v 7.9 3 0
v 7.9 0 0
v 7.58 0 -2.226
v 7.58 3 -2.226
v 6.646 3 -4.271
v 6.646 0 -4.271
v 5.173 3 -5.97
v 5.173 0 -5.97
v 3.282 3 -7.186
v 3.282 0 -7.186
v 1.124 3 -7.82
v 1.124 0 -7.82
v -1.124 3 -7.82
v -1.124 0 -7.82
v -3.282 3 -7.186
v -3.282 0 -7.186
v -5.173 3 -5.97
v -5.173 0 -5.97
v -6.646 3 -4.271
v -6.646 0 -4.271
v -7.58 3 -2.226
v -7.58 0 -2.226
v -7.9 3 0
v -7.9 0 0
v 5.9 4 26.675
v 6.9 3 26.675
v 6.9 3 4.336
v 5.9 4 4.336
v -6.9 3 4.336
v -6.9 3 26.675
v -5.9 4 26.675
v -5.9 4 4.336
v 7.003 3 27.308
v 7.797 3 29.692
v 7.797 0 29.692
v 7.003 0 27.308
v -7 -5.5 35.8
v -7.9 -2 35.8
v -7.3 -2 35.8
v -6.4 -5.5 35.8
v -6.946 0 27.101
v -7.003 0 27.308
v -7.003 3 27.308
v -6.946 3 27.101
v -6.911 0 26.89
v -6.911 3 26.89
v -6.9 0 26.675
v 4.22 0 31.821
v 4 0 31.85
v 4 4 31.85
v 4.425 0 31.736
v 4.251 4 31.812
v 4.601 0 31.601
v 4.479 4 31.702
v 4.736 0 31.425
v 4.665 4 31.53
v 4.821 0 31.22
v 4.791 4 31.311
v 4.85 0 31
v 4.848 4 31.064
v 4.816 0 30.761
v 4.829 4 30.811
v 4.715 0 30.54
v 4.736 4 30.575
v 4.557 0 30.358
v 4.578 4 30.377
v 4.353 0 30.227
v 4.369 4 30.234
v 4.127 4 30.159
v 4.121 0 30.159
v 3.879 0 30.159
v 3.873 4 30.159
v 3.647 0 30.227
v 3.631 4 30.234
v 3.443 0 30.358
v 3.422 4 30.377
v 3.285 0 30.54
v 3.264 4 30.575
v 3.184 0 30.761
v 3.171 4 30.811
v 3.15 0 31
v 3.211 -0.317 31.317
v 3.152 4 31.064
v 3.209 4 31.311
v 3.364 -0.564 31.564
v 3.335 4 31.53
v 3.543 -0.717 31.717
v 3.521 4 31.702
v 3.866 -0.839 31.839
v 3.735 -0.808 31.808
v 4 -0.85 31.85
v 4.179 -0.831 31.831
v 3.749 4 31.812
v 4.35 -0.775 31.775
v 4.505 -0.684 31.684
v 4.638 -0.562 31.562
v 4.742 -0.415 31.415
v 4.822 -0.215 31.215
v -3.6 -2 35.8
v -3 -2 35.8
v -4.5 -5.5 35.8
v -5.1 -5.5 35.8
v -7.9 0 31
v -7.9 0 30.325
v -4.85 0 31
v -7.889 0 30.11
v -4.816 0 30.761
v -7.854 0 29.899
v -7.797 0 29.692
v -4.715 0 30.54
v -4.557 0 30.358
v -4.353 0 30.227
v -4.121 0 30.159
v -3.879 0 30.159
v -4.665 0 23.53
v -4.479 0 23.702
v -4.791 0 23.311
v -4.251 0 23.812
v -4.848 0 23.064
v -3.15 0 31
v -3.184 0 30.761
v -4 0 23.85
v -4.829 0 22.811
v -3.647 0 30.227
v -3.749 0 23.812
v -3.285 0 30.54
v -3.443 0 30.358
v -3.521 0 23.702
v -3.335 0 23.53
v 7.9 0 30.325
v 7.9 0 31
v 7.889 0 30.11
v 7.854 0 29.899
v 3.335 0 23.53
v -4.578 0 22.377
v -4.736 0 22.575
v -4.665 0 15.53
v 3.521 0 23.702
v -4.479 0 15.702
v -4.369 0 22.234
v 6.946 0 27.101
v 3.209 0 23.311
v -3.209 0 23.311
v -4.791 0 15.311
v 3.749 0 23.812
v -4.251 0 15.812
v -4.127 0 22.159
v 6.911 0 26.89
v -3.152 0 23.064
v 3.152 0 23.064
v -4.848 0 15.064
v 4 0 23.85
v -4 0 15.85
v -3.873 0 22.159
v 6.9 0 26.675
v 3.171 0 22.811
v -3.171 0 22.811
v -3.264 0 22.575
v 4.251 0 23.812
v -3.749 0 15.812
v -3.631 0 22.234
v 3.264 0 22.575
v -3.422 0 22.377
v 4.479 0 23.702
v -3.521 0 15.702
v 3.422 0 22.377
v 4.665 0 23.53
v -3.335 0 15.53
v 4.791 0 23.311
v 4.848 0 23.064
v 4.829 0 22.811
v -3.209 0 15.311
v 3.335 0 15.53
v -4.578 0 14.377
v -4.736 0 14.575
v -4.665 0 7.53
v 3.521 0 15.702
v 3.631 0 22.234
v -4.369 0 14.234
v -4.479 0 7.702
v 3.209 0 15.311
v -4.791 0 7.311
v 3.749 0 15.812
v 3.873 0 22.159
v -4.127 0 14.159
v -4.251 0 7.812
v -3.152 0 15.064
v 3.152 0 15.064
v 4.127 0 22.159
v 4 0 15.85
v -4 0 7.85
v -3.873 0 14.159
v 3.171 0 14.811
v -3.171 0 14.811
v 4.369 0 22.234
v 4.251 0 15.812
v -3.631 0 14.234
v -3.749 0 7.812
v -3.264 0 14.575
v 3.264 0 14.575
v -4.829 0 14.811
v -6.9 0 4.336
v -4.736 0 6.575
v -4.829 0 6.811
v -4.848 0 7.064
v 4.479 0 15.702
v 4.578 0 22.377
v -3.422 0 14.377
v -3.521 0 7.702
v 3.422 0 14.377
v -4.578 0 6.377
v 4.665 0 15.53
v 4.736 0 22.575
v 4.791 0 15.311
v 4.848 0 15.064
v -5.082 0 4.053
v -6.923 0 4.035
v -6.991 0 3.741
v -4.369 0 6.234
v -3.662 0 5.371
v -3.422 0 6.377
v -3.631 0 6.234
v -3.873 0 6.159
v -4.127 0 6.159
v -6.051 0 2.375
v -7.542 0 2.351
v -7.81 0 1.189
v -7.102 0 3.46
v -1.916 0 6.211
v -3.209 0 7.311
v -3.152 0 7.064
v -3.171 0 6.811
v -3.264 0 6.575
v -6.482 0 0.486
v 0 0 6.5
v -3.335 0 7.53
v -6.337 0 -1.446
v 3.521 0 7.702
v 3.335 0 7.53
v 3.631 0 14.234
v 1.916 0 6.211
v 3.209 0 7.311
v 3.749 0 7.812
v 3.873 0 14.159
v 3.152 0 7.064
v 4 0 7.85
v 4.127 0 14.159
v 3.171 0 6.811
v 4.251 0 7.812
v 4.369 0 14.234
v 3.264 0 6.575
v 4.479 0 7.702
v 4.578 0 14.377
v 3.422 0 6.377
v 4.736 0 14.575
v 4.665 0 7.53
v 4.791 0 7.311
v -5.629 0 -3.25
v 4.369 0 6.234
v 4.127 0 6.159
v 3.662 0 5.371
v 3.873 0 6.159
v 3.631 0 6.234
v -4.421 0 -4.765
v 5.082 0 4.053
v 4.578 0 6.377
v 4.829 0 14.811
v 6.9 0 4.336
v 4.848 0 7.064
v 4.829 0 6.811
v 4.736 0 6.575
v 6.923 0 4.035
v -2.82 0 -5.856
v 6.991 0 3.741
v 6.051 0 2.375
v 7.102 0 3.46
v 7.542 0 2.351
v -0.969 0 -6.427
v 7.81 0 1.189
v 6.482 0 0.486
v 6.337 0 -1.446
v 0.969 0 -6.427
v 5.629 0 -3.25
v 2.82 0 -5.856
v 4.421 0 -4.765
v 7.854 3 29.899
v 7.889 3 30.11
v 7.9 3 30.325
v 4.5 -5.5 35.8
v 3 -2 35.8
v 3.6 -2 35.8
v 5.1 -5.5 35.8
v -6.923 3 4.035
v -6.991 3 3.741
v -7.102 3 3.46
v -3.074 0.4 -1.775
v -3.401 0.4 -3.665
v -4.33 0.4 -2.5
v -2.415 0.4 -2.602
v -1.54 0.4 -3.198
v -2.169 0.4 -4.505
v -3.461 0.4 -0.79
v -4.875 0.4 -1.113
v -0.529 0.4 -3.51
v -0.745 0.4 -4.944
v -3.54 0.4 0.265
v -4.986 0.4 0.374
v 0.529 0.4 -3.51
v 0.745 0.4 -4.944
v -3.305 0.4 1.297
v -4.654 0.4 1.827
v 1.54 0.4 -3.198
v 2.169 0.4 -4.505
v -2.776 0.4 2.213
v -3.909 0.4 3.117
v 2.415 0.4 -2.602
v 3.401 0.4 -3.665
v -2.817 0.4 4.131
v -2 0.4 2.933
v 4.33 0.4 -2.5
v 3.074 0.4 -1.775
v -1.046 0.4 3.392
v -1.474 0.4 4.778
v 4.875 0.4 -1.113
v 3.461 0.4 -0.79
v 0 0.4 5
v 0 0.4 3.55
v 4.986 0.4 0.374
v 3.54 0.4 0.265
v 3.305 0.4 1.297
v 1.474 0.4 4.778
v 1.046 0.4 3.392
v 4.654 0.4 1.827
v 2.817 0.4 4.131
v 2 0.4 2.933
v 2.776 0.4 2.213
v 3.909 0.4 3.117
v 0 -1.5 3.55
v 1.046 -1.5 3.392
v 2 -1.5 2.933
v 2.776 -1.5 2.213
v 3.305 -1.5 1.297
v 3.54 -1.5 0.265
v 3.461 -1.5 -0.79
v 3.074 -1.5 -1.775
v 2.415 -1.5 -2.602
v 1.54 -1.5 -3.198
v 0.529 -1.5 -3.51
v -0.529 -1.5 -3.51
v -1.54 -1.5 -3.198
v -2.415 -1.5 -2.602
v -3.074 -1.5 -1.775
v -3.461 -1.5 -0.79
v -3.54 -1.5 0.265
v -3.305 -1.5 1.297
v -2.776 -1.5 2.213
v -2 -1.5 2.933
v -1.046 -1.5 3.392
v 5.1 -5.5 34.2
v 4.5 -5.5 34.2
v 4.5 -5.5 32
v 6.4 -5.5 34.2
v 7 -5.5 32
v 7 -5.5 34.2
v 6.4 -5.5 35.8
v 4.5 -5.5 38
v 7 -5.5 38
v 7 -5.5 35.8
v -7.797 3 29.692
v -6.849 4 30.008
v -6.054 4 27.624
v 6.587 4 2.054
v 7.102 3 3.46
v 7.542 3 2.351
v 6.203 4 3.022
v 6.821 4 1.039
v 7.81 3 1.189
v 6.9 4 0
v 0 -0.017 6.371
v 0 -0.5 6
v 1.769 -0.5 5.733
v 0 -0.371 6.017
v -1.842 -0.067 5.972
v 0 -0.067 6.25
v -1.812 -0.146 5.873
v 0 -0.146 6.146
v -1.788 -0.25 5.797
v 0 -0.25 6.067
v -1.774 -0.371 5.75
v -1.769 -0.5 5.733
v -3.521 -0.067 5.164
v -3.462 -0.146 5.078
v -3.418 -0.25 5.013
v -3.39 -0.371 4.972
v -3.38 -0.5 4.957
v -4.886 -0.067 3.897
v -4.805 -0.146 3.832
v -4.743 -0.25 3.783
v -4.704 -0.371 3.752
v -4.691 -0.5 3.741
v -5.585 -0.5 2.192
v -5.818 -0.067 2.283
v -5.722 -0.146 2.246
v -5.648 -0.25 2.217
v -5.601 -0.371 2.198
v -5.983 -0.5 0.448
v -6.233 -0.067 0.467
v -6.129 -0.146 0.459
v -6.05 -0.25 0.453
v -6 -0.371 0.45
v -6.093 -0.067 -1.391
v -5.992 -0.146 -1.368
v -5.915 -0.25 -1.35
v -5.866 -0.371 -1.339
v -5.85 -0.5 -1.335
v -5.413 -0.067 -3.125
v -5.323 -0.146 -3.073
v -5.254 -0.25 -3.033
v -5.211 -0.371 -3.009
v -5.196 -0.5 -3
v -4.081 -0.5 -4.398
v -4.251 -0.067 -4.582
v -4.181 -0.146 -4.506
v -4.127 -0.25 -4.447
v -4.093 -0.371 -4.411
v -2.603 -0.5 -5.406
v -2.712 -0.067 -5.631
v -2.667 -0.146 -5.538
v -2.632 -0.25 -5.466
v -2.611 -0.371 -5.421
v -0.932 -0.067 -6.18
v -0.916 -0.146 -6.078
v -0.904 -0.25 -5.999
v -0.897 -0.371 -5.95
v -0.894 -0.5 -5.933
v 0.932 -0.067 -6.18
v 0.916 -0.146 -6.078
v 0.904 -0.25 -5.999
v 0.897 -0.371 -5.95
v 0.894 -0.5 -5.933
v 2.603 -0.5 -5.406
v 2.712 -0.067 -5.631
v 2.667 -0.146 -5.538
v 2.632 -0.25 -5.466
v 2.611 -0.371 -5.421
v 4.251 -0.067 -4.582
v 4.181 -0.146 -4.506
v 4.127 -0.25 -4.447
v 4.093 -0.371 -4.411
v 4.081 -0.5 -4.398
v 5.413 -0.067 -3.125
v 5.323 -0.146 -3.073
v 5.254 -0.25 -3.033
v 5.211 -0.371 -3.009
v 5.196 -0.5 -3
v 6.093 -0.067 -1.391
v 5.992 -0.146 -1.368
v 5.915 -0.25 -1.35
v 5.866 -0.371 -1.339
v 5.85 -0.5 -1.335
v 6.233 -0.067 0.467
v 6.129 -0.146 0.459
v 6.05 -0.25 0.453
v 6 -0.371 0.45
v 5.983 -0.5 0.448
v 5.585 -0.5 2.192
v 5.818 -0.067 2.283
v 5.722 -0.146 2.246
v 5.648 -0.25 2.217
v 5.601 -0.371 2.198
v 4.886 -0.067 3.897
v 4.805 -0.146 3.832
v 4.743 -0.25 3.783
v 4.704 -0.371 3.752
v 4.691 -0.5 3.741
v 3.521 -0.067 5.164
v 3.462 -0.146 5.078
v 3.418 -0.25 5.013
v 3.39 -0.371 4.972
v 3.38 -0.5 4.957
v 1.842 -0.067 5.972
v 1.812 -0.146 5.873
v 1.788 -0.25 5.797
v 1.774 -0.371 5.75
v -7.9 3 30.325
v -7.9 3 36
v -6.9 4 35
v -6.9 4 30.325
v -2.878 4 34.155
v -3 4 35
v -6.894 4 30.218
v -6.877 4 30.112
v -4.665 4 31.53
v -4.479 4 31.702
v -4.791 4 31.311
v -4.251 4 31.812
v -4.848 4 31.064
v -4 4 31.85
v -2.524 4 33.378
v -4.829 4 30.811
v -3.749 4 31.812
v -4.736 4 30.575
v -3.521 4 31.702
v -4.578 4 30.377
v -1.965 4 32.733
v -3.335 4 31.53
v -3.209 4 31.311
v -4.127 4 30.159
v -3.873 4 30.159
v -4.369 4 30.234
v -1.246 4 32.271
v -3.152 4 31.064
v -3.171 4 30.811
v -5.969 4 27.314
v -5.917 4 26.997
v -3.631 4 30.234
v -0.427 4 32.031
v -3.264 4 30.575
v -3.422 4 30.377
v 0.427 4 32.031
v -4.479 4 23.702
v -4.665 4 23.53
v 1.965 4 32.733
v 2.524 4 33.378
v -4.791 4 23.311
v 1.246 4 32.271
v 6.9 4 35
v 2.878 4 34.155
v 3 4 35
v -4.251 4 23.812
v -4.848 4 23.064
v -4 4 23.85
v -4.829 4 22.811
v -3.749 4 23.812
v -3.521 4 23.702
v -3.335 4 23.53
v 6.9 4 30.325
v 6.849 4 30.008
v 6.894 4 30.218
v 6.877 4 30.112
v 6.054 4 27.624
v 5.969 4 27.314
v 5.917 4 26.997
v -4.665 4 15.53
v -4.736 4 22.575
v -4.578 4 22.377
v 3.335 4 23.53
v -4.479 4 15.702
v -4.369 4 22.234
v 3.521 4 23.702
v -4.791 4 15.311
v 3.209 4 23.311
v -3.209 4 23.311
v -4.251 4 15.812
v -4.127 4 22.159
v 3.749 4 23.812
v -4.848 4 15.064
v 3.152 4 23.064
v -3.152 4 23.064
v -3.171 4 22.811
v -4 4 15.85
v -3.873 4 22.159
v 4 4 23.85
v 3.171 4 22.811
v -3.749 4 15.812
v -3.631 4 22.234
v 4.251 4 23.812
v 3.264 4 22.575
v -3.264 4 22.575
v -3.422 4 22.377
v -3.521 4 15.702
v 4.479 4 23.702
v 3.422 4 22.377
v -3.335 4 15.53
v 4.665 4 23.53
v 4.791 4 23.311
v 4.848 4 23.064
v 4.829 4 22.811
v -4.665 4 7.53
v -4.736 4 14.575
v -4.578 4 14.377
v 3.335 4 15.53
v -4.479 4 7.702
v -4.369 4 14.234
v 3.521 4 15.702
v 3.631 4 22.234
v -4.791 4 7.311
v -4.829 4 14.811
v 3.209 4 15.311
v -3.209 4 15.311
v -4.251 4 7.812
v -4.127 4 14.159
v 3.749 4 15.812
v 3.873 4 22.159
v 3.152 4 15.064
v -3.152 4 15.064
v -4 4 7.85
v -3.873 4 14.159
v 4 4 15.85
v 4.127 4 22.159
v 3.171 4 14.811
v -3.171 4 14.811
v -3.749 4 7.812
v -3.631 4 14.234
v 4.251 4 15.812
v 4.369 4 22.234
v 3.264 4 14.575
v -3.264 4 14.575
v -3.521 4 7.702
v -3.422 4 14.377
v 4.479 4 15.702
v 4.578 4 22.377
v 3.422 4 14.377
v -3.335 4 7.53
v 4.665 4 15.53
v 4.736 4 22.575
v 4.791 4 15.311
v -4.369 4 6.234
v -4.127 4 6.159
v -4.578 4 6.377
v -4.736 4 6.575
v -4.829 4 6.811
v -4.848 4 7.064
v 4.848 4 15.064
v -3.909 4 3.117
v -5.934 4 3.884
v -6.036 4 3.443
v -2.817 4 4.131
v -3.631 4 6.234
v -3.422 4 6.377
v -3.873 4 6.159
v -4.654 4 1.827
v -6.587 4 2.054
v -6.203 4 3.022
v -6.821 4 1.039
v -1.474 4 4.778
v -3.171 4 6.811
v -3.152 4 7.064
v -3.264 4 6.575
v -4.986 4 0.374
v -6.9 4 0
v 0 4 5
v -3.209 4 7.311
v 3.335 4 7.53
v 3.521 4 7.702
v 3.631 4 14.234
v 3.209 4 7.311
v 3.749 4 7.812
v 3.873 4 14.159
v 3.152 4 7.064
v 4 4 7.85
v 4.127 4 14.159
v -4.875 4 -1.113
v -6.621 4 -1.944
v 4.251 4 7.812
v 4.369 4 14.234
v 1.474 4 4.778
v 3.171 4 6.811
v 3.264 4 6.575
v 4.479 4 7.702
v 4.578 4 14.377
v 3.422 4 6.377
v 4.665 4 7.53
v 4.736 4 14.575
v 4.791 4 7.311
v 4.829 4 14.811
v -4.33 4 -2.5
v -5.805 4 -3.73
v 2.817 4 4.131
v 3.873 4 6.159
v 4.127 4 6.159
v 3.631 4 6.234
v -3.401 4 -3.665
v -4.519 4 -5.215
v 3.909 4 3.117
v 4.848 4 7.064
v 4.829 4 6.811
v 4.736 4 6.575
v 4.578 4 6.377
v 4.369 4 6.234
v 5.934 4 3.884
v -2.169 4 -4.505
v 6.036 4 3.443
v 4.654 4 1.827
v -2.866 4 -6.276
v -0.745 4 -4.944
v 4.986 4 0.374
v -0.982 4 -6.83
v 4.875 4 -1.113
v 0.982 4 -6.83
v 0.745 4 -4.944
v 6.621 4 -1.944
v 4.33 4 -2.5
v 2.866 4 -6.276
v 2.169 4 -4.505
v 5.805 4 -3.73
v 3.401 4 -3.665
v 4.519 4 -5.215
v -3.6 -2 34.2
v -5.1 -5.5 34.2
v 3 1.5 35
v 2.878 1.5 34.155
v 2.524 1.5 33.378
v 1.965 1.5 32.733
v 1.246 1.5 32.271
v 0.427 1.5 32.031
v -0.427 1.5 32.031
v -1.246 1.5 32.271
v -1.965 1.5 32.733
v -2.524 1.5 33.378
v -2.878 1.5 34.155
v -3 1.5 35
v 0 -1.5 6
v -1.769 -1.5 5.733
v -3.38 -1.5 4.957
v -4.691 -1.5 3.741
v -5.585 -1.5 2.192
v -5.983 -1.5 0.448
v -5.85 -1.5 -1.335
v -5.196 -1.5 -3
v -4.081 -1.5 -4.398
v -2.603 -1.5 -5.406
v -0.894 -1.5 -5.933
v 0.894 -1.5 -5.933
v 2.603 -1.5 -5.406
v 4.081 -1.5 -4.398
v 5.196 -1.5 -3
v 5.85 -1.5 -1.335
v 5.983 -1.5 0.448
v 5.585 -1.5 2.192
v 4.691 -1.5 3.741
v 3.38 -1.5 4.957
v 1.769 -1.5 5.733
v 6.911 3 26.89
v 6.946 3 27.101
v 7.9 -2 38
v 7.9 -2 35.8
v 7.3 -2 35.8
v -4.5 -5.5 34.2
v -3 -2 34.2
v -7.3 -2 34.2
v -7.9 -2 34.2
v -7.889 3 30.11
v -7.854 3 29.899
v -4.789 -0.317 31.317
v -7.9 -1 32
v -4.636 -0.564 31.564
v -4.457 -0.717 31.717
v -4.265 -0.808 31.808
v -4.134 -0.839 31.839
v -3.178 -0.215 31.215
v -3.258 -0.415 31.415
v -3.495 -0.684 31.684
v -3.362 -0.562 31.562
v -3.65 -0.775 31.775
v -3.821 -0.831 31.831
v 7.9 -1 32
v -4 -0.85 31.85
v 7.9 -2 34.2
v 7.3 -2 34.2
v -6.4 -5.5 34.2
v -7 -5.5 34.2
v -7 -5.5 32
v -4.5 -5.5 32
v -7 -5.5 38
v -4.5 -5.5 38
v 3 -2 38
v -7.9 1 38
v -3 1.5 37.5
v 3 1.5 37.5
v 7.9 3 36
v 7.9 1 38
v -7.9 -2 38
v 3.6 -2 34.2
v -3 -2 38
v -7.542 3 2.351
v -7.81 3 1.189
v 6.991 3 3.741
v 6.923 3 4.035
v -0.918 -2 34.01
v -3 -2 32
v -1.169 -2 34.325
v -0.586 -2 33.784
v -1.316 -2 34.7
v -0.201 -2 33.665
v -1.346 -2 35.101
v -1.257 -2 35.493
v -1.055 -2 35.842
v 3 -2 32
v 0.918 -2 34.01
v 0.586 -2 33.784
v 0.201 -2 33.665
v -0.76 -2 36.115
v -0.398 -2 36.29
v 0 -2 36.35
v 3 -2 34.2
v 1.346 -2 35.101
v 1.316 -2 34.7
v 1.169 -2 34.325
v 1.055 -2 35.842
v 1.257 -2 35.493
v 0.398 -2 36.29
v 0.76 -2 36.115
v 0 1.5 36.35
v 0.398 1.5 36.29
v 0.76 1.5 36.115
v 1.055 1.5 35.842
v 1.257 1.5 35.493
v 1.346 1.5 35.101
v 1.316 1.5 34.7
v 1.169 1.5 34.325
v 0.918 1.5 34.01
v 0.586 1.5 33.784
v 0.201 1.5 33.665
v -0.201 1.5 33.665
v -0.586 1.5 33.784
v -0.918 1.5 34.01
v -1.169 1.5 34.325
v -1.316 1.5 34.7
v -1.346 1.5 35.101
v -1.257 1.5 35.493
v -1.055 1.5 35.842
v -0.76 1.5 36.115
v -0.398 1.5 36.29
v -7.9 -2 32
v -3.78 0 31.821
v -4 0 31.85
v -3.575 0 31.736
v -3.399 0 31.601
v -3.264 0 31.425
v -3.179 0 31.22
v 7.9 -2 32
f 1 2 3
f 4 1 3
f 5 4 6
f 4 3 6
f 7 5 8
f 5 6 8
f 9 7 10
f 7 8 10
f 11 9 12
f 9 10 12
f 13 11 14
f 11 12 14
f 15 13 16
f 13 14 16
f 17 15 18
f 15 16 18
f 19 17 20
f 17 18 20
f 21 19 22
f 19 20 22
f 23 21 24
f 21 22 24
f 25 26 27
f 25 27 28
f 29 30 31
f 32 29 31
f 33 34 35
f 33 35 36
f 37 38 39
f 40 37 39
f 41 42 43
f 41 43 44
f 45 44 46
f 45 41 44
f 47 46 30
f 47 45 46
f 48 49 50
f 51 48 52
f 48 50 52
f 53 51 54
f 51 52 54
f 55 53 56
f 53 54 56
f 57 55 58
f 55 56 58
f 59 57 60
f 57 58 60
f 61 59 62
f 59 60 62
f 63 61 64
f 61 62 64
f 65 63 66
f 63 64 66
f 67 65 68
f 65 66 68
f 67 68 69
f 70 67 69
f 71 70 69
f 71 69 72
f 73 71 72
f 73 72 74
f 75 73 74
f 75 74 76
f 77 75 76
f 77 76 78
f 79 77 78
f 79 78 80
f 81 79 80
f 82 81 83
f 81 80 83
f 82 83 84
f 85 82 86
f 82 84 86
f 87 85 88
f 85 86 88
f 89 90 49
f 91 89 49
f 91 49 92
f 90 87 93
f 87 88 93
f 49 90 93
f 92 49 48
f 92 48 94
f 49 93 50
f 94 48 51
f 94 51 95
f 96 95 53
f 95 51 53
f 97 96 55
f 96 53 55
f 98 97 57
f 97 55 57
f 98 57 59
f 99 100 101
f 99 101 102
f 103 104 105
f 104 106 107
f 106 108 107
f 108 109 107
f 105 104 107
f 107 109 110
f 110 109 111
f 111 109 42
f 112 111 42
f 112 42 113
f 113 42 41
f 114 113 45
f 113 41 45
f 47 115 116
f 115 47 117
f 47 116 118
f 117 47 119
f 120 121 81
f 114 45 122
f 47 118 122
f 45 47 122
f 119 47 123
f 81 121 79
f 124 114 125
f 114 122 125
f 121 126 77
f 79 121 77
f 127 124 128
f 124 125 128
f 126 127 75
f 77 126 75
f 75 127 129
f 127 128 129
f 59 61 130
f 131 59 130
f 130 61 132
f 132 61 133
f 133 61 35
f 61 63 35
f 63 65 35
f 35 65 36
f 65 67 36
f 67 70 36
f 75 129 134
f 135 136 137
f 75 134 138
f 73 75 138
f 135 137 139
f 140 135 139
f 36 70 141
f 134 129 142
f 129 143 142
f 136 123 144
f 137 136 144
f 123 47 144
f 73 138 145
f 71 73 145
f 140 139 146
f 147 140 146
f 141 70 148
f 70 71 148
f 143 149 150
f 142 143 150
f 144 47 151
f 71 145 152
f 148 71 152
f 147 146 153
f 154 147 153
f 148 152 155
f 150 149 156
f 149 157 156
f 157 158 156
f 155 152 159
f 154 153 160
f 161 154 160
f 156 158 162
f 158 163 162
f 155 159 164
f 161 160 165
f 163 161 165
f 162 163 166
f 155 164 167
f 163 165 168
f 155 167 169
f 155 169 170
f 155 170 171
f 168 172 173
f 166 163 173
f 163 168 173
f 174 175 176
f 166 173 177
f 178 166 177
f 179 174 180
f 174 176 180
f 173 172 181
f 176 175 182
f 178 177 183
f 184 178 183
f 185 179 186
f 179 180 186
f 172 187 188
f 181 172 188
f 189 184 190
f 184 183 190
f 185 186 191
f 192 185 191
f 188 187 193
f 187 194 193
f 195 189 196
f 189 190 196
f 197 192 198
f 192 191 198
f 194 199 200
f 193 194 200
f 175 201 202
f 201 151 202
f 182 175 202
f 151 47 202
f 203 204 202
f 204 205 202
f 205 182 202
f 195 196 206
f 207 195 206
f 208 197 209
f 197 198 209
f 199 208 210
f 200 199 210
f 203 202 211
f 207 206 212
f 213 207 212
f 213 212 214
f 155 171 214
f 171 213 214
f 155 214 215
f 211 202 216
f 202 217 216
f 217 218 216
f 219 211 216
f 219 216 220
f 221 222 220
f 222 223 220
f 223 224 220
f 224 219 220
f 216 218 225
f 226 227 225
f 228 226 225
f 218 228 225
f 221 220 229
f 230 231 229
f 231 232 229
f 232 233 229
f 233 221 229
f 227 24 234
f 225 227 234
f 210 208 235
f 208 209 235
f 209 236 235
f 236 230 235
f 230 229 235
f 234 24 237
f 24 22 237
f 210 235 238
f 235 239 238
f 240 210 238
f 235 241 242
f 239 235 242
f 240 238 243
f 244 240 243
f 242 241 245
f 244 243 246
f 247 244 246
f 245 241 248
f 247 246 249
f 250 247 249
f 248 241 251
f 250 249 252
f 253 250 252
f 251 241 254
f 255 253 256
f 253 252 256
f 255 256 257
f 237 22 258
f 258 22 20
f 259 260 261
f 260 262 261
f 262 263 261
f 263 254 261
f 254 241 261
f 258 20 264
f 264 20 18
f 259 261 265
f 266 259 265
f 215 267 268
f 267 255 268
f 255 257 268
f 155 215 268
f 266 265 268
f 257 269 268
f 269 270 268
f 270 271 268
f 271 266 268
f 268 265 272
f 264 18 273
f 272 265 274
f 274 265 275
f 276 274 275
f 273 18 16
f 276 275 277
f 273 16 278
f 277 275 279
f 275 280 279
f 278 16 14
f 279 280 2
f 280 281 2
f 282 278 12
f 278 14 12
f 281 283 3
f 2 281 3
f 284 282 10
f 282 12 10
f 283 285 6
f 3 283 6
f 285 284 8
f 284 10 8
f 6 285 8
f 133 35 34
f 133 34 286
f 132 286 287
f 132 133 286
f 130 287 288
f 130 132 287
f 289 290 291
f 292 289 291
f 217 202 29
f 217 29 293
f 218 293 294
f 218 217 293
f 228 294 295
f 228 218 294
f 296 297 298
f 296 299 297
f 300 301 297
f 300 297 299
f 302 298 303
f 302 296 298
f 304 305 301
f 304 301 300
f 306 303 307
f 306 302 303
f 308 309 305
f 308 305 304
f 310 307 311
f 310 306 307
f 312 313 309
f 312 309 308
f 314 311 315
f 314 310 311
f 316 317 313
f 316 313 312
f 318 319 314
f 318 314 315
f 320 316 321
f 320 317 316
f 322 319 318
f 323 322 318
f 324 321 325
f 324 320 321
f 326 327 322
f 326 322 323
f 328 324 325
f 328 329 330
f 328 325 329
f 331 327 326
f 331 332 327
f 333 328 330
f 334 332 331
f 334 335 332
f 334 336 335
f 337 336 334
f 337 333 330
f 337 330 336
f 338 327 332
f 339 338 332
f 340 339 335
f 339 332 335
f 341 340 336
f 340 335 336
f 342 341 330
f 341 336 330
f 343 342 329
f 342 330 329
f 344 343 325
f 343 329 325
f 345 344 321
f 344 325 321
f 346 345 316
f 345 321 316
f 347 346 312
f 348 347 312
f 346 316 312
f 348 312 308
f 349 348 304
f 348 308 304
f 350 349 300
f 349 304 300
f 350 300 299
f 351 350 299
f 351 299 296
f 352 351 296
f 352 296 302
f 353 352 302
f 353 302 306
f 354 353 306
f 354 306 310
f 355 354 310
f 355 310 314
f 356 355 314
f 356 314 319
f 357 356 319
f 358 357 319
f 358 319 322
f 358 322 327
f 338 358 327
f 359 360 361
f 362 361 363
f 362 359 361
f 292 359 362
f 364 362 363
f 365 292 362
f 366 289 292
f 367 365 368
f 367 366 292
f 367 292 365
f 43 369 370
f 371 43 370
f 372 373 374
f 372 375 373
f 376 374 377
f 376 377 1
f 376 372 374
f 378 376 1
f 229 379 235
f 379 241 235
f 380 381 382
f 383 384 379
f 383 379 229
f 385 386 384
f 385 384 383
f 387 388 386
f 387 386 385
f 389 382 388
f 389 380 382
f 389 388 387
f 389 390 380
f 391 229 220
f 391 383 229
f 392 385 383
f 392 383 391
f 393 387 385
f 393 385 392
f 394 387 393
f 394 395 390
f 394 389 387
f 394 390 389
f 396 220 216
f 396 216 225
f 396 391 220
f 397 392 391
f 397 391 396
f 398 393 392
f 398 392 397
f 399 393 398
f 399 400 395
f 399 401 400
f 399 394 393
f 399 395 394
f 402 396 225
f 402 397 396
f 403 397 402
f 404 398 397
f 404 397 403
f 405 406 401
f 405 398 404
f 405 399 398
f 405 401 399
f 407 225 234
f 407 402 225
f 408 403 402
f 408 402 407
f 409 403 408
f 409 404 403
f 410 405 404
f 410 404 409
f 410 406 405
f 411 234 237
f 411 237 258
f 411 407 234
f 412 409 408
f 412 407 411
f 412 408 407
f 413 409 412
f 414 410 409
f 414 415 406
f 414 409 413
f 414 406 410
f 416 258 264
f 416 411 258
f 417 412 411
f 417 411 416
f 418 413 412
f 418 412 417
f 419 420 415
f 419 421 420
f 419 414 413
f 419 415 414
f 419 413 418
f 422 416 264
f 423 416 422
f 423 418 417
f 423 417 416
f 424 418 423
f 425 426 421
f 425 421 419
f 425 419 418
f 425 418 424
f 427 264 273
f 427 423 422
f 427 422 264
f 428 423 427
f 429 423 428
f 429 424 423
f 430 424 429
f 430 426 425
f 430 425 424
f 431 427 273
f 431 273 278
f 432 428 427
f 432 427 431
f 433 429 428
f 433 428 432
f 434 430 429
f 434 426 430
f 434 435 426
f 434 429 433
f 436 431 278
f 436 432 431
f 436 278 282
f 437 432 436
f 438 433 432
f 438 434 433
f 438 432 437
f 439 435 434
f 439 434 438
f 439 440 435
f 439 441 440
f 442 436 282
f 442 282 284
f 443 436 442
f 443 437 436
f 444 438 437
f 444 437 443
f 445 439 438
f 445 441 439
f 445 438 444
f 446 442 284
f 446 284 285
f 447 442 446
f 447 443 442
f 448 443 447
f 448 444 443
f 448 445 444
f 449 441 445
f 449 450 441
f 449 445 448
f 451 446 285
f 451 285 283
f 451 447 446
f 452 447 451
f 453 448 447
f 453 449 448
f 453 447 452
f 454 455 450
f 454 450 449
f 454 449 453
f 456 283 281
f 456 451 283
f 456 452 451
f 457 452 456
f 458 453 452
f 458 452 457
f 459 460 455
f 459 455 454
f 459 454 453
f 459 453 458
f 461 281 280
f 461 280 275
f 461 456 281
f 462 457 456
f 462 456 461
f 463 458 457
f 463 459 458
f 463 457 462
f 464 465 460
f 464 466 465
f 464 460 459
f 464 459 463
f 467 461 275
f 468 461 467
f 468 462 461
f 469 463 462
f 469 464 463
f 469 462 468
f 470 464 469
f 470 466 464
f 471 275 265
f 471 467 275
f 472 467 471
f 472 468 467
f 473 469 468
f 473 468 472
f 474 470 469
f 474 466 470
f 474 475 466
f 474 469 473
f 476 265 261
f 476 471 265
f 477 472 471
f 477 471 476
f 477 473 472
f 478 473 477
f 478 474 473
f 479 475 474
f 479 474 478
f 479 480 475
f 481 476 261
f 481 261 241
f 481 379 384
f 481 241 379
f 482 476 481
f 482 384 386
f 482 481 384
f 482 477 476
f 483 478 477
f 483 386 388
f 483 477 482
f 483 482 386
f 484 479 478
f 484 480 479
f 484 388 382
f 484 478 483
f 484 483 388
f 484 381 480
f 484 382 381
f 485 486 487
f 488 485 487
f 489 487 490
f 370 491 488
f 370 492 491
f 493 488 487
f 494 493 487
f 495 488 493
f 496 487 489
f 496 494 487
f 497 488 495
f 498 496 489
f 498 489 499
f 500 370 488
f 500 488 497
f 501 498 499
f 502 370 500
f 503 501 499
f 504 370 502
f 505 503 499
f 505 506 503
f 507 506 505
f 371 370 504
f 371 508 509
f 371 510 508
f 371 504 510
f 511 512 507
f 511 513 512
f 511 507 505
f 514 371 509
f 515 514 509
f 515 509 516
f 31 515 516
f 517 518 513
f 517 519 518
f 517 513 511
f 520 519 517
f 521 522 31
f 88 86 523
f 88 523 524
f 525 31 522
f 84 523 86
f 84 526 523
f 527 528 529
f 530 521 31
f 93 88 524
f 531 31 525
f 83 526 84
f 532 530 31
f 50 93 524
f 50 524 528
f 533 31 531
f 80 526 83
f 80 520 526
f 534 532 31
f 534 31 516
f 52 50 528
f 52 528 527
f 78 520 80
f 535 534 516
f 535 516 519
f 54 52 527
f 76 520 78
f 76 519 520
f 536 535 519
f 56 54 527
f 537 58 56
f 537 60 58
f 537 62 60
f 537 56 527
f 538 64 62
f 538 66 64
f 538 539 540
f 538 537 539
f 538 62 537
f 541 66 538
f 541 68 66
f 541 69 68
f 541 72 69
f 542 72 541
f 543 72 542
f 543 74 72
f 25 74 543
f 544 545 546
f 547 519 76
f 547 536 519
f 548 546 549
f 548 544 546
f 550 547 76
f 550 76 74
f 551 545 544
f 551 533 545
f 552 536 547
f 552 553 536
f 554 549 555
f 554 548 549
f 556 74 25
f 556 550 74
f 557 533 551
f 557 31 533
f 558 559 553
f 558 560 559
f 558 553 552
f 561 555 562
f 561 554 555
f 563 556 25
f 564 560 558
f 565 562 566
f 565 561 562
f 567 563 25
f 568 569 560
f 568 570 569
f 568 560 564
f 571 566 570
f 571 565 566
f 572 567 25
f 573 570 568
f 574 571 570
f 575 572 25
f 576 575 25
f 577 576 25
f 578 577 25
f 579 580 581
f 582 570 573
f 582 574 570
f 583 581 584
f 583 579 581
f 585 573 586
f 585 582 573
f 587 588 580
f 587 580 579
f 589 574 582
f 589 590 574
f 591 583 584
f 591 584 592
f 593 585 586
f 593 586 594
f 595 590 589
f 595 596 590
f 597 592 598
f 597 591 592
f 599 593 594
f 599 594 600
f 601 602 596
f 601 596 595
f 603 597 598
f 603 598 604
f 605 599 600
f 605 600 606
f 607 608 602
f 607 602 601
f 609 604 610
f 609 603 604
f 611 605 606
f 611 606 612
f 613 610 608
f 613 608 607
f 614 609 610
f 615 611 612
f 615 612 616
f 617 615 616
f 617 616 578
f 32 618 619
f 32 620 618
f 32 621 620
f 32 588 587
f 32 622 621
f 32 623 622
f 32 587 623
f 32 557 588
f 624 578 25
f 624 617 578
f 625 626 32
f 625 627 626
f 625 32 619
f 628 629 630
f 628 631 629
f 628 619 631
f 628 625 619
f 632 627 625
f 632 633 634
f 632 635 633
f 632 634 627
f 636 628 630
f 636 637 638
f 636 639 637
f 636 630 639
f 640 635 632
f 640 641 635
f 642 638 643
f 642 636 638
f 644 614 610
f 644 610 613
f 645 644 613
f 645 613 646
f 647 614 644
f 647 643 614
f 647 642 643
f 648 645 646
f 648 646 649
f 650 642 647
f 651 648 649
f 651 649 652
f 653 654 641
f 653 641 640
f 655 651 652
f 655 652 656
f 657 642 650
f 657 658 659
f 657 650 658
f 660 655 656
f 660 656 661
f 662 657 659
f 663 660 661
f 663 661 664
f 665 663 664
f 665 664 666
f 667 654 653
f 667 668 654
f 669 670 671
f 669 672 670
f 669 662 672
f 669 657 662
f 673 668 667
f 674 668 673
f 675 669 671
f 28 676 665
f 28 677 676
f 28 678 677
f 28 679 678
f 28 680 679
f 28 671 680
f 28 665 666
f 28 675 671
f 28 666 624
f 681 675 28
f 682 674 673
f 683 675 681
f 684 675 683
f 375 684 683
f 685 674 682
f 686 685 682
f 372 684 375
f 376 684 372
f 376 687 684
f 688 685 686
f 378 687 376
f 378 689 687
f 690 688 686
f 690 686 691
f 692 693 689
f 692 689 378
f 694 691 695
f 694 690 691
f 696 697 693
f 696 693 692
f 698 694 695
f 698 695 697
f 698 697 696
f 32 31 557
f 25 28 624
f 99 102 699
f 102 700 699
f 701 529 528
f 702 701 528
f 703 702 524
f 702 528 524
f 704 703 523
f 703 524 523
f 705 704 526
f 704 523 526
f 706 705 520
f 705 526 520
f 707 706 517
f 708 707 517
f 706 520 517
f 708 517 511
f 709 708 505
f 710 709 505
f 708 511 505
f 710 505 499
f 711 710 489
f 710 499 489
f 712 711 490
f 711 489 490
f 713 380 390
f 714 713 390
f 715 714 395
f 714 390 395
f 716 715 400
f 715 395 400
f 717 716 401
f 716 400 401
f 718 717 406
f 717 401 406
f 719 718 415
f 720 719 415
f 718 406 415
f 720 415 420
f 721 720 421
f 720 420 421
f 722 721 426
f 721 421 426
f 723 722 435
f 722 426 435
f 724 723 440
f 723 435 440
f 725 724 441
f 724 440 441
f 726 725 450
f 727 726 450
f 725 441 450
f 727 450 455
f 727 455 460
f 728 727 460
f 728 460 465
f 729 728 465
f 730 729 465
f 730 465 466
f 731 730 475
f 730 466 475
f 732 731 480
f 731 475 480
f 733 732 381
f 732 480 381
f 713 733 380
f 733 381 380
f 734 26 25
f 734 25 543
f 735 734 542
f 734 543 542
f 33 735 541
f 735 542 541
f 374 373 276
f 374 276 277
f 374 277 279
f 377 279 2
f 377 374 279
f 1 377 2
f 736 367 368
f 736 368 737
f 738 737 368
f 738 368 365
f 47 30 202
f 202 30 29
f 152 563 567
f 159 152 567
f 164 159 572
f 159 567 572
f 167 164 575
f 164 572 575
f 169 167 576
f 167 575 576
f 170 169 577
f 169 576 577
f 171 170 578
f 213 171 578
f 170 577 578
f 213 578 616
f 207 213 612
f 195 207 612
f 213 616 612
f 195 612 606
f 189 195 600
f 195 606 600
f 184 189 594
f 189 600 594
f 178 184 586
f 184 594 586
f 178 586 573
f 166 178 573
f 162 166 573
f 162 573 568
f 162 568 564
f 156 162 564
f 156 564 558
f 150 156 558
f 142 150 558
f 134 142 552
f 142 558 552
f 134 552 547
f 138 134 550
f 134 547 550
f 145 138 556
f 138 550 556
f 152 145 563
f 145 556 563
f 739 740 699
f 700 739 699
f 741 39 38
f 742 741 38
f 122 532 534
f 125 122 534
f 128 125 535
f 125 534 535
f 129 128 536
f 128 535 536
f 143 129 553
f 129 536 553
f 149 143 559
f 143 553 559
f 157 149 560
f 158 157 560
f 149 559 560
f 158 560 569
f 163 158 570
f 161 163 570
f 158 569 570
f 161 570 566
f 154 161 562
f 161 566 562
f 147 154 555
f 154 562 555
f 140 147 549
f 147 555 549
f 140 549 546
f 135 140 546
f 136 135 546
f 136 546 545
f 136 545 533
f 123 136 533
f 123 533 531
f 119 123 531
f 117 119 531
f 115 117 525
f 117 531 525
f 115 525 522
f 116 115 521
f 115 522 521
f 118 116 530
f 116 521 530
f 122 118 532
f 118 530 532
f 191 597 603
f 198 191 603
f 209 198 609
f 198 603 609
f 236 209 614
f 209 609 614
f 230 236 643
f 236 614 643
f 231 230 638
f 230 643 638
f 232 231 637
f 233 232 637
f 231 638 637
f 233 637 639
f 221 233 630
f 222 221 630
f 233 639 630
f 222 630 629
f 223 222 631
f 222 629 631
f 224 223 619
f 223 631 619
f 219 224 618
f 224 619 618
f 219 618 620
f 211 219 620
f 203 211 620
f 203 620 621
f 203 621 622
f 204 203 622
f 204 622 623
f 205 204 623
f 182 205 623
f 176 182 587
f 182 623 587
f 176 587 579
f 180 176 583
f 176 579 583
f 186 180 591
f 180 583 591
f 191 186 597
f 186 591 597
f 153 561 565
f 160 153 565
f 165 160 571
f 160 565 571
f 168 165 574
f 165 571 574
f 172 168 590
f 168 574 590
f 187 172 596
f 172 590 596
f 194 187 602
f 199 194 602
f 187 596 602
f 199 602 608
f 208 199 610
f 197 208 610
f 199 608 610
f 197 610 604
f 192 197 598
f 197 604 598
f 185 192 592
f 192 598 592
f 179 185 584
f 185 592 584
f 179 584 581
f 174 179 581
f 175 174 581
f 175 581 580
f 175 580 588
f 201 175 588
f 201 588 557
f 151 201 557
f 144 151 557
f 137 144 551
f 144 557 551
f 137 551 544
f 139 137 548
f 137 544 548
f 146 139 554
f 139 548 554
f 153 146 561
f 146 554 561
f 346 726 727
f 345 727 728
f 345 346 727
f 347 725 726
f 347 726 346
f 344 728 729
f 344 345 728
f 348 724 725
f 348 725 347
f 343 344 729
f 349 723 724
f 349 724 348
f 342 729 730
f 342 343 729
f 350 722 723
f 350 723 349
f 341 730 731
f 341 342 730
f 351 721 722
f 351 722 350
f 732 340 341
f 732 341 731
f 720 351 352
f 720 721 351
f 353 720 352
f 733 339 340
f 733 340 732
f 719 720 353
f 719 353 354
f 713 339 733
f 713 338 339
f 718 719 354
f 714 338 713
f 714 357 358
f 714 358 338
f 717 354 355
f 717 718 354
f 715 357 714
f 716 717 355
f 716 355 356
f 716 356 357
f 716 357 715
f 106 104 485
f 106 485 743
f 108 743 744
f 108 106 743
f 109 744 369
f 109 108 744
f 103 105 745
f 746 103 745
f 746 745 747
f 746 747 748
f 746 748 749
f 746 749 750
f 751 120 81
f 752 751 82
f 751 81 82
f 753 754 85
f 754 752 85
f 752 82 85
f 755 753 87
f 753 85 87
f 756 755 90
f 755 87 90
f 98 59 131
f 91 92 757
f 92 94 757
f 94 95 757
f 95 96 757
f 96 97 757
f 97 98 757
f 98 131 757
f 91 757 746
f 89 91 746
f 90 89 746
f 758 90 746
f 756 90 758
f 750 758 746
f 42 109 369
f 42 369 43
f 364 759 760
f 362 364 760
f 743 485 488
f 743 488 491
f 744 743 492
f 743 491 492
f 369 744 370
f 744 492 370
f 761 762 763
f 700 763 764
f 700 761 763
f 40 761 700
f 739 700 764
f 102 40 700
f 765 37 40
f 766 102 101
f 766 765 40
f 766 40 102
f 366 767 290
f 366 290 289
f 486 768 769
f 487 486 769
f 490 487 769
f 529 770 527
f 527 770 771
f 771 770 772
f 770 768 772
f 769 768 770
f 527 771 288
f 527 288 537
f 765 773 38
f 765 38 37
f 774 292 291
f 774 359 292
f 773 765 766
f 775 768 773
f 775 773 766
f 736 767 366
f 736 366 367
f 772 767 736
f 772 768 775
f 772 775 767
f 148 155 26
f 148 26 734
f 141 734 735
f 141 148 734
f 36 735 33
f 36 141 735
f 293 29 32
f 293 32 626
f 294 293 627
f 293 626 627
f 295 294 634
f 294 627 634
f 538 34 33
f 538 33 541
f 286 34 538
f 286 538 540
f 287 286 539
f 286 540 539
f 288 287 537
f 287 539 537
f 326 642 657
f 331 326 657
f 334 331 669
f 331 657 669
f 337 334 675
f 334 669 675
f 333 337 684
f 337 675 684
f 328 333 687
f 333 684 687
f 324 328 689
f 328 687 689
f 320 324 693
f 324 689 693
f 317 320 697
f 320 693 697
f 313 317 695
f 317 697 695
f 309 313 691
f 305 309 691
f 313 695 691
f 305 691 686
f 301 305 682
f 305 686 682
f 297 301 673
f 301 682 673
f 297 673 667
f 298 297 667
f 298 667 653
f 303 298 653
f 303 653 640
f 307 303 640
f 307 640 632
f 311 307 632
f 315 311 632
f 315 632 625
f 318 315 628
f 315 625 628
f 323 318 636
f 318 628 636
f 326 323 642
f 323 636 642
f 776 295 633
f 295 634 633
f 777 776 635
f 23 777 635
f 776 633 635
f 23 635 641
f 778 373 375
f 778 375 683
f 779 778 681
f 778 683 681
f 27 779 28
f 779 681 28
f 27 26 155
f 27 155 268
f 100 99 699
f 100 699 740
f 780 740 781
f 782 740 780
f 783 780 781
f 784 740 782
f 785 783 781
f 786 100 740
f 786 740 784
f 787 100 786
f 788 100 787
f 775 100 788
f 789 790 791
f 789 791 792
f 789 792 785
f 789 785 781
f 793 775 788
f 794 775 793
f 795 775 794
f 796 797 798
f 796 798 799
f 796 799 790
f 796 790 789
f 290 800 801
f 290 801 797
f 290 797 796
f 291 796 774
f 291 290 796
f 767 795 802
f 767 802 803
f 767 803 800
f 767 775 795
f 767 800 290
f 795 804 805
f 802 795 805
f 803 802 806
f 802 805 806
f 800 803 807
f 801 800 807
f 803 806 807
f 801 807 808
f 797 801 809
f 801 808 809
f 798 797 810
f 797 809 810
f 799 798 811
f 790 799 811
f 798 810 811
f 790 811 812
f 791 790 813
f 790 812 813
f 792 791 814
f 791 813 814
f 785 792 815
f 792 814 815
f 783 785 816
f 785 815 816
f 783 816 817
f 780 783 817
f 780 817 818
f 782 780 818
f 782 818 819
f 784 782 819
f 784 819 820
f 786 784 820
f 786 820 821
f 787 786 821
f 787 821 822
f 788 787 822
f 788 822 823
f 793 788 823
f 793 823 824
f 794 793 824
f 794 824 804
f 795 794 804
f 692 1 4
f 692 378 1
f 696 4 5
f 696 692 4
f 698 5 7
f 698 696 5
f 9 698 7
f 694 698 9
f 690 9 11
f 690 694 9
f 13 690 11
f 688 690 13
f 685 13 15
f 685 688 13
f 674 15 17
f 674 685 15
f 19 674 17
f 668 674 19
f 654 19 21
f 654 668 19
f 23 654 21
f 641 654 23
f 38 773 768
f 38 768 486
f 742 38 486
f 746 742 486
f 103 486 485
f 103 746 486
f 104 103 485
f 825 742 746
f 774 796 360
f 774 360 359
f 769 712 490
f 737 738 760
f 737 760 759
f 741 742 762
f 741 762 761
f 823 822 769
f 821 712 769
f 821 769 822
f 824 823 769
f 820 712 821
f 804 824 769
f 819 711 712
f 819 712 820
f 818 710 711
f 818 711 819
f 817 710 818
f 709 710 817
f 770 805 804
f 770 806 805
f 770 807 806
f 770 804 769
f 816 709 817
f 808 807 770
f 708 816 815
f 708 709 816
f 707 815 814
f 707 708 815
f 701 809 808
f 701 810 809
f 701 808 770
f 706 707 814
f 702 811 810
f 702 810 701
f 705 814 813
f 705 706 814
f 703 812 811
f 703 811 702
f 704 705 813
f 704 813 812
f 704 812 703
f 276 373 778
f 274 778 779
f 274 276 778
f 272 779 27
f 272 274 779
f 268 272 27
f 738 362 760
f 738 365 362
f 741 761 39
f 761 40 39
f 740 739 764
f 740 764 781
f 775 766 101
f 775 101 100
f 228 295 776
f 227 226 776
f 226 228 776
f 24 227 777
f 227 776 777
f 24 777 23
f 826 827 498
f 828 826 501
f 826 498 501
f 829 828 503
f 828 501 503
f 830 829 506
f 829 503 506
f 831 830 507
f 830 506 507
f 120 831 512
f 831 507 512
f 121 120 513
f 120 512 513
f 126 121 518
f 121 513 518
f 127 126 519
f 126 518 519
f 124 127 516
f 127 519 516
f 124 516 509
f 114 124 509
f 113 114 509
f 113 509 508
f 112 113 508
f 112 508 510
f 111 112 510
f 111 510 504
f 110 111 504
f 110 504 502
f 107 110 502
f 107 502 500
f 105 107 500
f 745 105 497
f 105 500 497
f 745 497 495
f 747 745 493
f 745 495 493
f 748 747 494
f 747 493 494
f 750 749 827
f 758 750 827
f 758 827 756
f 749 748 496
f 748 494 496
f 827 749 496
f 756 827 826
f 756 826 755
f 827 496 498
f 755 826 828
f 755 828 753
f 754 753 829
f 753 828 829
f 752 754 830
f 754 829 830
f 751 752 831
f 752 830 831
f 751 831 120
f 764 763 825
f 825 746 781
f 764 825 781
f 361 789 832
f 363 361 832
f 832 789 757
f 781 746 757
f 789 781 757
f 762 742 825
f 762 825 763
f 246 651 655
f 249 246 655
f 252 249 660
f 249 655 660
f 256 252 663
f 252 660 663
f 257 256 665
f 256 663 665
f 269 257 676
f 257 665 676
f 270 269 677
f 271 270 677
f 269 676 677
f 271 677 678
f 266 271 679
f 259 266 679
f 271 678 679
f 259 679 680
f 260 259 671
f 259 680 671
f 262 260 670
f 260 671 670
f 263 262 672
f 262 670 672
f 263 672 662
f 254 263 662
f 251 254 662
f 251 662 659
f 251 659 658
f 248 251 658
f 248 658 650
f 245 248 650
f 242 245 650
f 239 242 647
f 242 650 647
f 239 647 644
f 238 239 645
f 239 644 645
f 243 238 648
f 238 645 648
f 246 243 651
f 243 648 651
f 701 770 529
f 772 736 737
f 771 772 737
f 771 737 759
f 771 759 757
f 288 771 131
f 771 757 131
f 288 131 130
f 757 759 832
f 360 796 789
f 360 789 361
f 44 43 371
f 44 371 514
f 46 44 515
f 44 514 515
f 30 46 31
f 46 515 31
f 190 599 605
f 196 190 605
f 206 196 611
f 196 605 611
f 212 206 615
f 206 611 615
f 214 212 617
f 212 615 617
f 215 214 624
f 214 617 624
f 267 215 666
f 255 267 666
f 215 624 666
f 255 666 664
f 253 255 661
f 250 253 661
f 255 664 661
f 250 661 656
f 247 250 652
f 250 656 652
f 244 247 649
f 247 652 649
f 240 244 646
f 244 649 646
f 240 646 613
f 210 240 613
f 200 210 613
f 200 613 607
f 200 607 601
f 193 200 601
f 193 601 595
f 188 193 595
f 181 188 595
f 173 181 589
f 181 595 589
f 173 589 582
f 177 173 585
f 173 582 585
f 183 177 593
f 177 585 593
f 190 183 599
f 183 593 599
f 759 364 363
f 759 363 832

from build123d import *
from build123d.topology import SkipClean

# Parameters (mm, degrees)
EXTRUDE_1_DEPTH        = 4
EXTRUDE_3_DEPTH        = 6
CHAMFER_1_SIZE         = 3
SKETCH_5_R             = 0.85
CUT_EXTRUDE_1_DEPTH    = 4
PATTERN_LINEAR_1_COUNT = 4
PATTERN_LINEAR_1_PITCH = 8
CUT_EXTRUDE_2_DEPTH    = 2.5
CUT_EXTRUDE_3_REACH    = 41.439
SKETCH_7_R             = 1.35
SKETCH_8_R             = 6
EXTRUDE_4_DEPTH        = 1.5
FILLET_1_R             = 0.5
SKETCH_9_R             = 5
CUT_EXTRUDE_4_DEPTH    = 3.6
SKETCH_10_R            = 3.55
CUT_EXTRUDE_5_DEPTH    = 3.6
CUT_EXTRUDE_6_DEPTH    = 0.8
CUT_EXTRUDE_7_DEPTH    = 40.958228189
FILLET_2_R             = 2
CHAMFER_2_SIZE         = 1


with BuildPart() as part:
    # ｽｹｯﾁ1 → ﾎﾞｽ - 押し出し1 (new body)
    with BuildSketch(Plane(origin=(0, 0, 0), x_dir=(1, 0, 0), z_dir=(0, 1, 0))):
        with BuildLine():
            Line((-7.9, 0), (-7.9, -38))
            Line((-7.9, -38), (7.9, -38))
            Line((7.9, -38), (7.9, 0))
            ThreePointArc((7.9, 0), (0, 7.9), (-7.9, 0))
        make_face()
    extrude(amount=EXTRUDE_1_DEPTH)

    # ｽｹｯﾁ4 → ﾎﾞｽ - 押し出し3 (add)
    with BuildSketch(Plane.XY.offset(38)):
        Polygon((-7, -5.5), (-4.5, -5.5), (-3, -2), (3, -2), (4.5, -5.5), (7, -5.5), (7.9, -2), (7.9, 0), (-7.9, 0), (-7.9, -2), align=None)
    extrude(amount=-EXTRUDE_3_DEPTH)

    # 面取り1
    chamfer_1_edges = [part.edges().sort_by_distance(p)[0] for p in [
        (0, 4, 38),
    ]]
    chamfer(chamfer_1_edges, length=CHAMFER_1_SIZE)

    # ｽｹｯﾁ5 → ｶｯﾄ - 押し出し1 (cut)
    with BuildSketch(Plane(origin=(0, 4, 0), x_dir=(1, 0, 0), z_dir=(0, 1, 0))):
        with Locations(Location((-4, -31, 0), (0, 0, 270))):
            Circle(SKETCH_5_R)
        with Locations(Location((4, -31, 0), (0, 0, 270))):
            Circle(SKETCH_5_R)
    cut_extrude_1 = extrude(amount=-CUT_EXTRUDE_1_DEPTH, mode=Mode.SUBTRACT)

    # 直線ﾊﾟﾀｰﾝ1: ｶｯﾄ - 押し出し1 ×4
    with Locations(*[(0, 0, -i * PATTERN_LINEAR_1_PITCH) for i in range(1, PATTERN_LINEAR_1_COUNT)]):
        add(cut_extrude_1, mode=Mode.SUBTRACT)

    # ｽｹｯﾁ6 → ｶｯﾄ - 押し出し2 (cut)
    with BuildSketch(Plane(origin=(0, 4, 0), x_dir=(1, 0, 0), z_dir=(0, 1, 0))):
        with BuildLine():
            Line((-3, -35), (-3, -39))
            Line((-3, -39), (3, -39))
            Line((3, -39), (3, -35))
            ThreePointArc((3, -35), (0, -32), (-3, -35))
        make_face()
    extrude(amount=-CUT_EXTRUDE_2_DEPTH, mode=Mode.SUBTRACT)

    # ｽｹｯﾁ7 → ｶｯﾄ - 押し出し3 (cut, up to next)
    with BuildSketch(Plane(origin=(0, 1.5, 0), x_dir=(1, 0, 0), z_dir=(0, 1, 0)), mode=Mode.PRIVATE) as cut_extrude_3_sk1:
        with Locations(Location((0, -35, 0), (0, 0, 270))):
            Circle(SKETCH_7_R)
    cut_extrude_3_tool1 = extrude(cut_extrude_3_sk1.sketch, amount=-CUT_EXTRUDE_3_REACH, mode=Mode.PRIVATE) & part.part
    add(cut_extrude_3_tool1.solids().sort_by_distance((0, 1.5, 35))[0], mode=Mode.SUBTRACT)

    # ｽｹｯﾁ8 → ﾎﾞｽ - 押し出し4 (add)
    with BuildSketch(Plane.XZ):
        with Locations(Location((0, 0, 0), (0, 0, 90))):
            Circle(SKETCH_8_R)
    extrude(amount=EXTRUDE_4_DEPTH)

    # ﾌｨﾚｯﾄ1
    fillet_1_edges = [part.edges().sort_by_distance(p)[0] for p in [
        (0, 0, -6),
    ]]
    fillet(fillet_1_edges, radius=FILLET_1_R)

    # ｽｹｯﾁ9 → ｶｯﾄ - 押し出し4 (cut)
    with BuildSketch(Plane(origin=(0, 4, 0), x_dir=(1, 0, 0), z_dir=(0, 1, 0))):
        with Locations(Location((0, 0, 0), (0, 0, 270))):
            Circle(SKETCH_9_R)
    extrude(amount=-CUT_EXTRUDE_4_DEPTH, mode=Mode.SUBTRACT)

    # ｽｹｯﾁ10 → ｶｯﾄ - 押し出し5 (cut)
    with BuildSketch(Plane(origin=(0, 0.4, 0), x_dir=(1, 0, 0), z_dir=(0, 1, 0))):
        with Locations(Location((0, 0, 0), (0, 0, 270))):
            Circle(SKETCH_10_R)
    extrude(amount=-CUT_EXTRUDE_5_DEPTH, mode=Mode.SUBTRACT)

    # ｽｹｯﾁ11 → ｶｯﾄ - 押し出し6 (cut, symmetric)
    with BuildSketch(Plane.XY.offset(35)):
        Polygon((3, -2), (4.5, -5.5), (5.1, -5.5), (3.6, -2), align=None)
        Polygon((7.9, -2), (7, -5.5), (6.4, -5.5), (7.3, -2), align=None)
    cut_extrude_6 = extrude(amount=CUT_EXTRUDE_6_DEPTH, both=True, mode=Mode.SUBTRACT)

    # ﾐﾗｰ1: ｶｯﾄ - 押し出し6 across plane
    add(cut_extrude_6.mirror(Plane(origin=(0, 0, 0), x_dir=(0, 0, 1), z_dir=(1, 0, 0))), mode=Mode.SUBTRACT)

    # ｽｹｯﾁ12 → ｶｯﾄ - 押し出し7 (cut, through all)
    with SkipClean():  # the faces are left unmerged after this step: merging them gives an invalid solid
        with BuildSketch(Plane(origin=(0, 4, 0), x_dir=(1, 0, 0), z_dir=(0, 1, 0))):
            with BuildLine():
                Line((-7.9, 0), (-7.9, -30))
                Line((-7.9, -30), (-6.9, -27))
                Line((-6.9, -27), (-6.9, -3.847076812))
                ThreePointArc((-6.9, -3.847076812), (-7.645913941, -1.987460691), (-7.9, 0))
            make_face()
        cut_extrude_7 = extrude(amount=-CUT_EXTRUDE_7_DEPTH, mode=Mode.SUBTRACT)

    # ﾐﾗｰ2: ｶｯﾄ - 押し出し7 across plane
    with SkipClean():  # the faces are left unmerged after this step: merging them gives an invalid solid
        add(cut_extrude_7.mirror(Plane(origin=(0, 0, 0), x_dir=(0, 0, 1), z_dir=(1, 0, 0))), mode=Mode.SUBTRACT)

    # ﾌｨﾚｯﾄ2
    fillet_2_edges = [part.edges().sort_by_distance(p)[0] for p in [
        (-6.9, 2, 3.847076812),
        (-6.9, 2, 27),
        (-7.9, 2, 30),
        (6.9, 2, 3.847076812),
        (7.9, 2, 30),
        (6.9, 2, 27),
    ]]
    fillet(fillet_2_edges, radius=FILLET_2_R)

    # 面取り2
    # the kernel refuses this chamfer: 1 mm, written as the material it adds along each edge
    with BuildSketch(Plane(origin=(7.9, 0, 32), x_dir=(0, 0.02749587661058639, -0.9996219169112968), z_dir=(-1, 0, 0))) as chamfer_2_piece_1_section:
        Polygon((CHAMFER_2_SIZE * 0.999621916911, CHAMFER_2_SIZE * 0.0274958766106), (-CHAMFER_2_SIZE * 0.0274958766106, CHAMFER_2_SIZE * 0.999621916911), (0, 0), align=None)
    chamfer_2_piece_1 = extrude(amount=15.8, mode=Mode.PRIVATE)
    chamfer_2_piece_1 = chamfer_2_piece_1 - Plane(origin=(-4, -0.34097177, 31), x_dir=(0, 0, 1), z_dir=(0, 1, 0)) * Cylinder(0.85, 36, mode=Mode.PRIVATE)
    chamfer_2_piece_1 = chamfer_2_piece_1 - Plane(origin=(4, -0.34097177, 31), x_dir=(0, 0, 1), z_dir=(0, 1, 0)) * Cylinder(0.85, 36, mode=Mode.PRIVATE)
    add(chamfer_2_piece_1)
    # the kernel refuses this chamfer: 1 mm, written as the material it takes off along each edge
    with BuildSketch(Plane(origin=(-7.9, 4, 30.32455532), x_dir=(-0.027495876610586487, -0.9996219169112968, 0), z_dir=(0, 0, 1)), Plane(origin=(7.9, 4, 37.571682988), x_dir=(0.027495876610586487, -0.9996219169112968, 0), z_dir=(0, 0, -1))) as chamfer_2_2_piece_1:
        Polygon((CHAMFER_2_SIZE * 0.999621916911, CHAMFER_2_SIZE * 0.0274958766106), (-CHAMFER_2_SIZE * 0.0274958766106, CHAMFER_2_SIZE * 0.999621916911), (0, 0), align=None)
    extrude(amount=7.247127668, mode=Mode.SUBTRACT)
    with BuildSketch(Plane(origin=(0, 4, 0), x_dir=(1, 0, 0), z_dir=(0, 0, 1))) as chamfer_2_2_piece_2:
        Polygon((7.9, -CHAMFER_2_SIZE), (7.9 - CHAMFER_2_SIZE, 0), (7.9, 0), align=None)
    revolve(axis=Axis((0, 4, 0), (0, 1, 0)), revolution_arc=180, mode=Mode.SUBTRACT)
    with BuildSketch(Plane(origin=(-5.9, 4, 30.32455532), x_dir=(-1, 0, 0), z_dir=(0, 0, 1))) as chamfer_2_2_piece_3:
        Polygon((2, CHAMFER_2_SIZE), (2 - CHAMFER_2_SIZE, 0), (2, 0), align=None)
    revolve(axis=Axis((-5.9, 4, 30.32455532), (0, -1, 0)), revolution_arc=18.434948823, mode=Mode.SUBTRACT)
    with BuildSketch(Plane(origin=(-7.797366596, 4, 29.692099788), x_dir=(-0.02608487890572092, -0.9996219169112968, -0.008694959635240314), z_dir=(0.3162277660168382, 0, -0.9486832980505138))) as chamfer_2_2_piece_4:
        Polygon((CHAMFER_2_SIZE * 0.999621916911, -CHAMFER_2_SIZE * 0.0274958766106), (-CHAMFER_2_SIZE * 0.0274958766106, -CHAMFER_2_SIZE * 0.999621916911), (0, 0), align=None)
    extrude(amount=2.513167019, mode=Mode.SUBTRACT)
    with BuildSketch(Plane(origin=(-8.9, 4, 26.67544468), x_dir=(0.9486832980505135, 0, 0.3162277660168389), z_dir=(-0.3162277660168389, 0, 0.9486832980505135))) as chamfer_2_2_piece_5:
        Polygon((2, -CHAMFER_2_SIZE), (2 + CHAMFER_2_SIZE, 0), (2, 0), align=None)
    revolve(axis=Axis((-8.9, 4, 26.67544468), (0, 1, 0)), revolution_arc=18.434948823, mode=Mode.SUBTRACT)
    with BuildSketch(Plane(origin=(-6.9, 4, 26.67544468), x_dir=(-0.027495876610586487, -0.9996219169112968, 0), z_dir=(0, 0, -1))) as chamfer_2_2_piece_6:
        Polygon((CHAMFER_2_SIZE * 0.999621916911, -CHAMFER_2_SIZE * 0.0274958766106), (-CHAMFER_2_SIZE * 0.0274958766106, -CHAMFER_2_SIZE * 0.999621916911), (0, 0), align=None)
    extrude(amount=22.339548002, mode=Mode.SUBTRACT)
    with BuildSketch(Plane(origin=(-8.9, 4, 4.335896678), x_dir=(1, 0, 0), z_dir=(0, 0, 1))) as chamfer_2_2_piece_7:
        Polygon((2, -CHAMFER_2_SIZE), (2 + CHAMFER_2_SIZE, 0), (2, 0), align=None)
    revolve(axis=Axis((-8.9, 4, 4.335896678), (0, 1, 0)), revolution_arc=25.974390018, mode=Mode.SUBTRACT)
    with BuildSketch(Plane(origin=(8.9, 4, 4.335896678), x_dir=(-0.8989898989898989, 0, -0.43796936138745074), z_dir=(0.43796936138745074, 0, -0.8989898989898989))) as chamfer_2_2_piece_8:
        Polygon((2, -CHAMFER_2_SIZE), (2 + CHAMFER_2_SIZE, 0), (2, 0), align=None)
    revolve(axis=Axis((8.9, 4, 4.335896678), (0, 1, 0)), revolution_arc=25.974390018, mode=Mode.SUBTRACT)
    with BuildSketch(Plane(origin=(6.9, 4, 26.67544468), x_dir=(0.027495876610586487, -0.9996219169112968, 0), z_dir=(0, 0, -1))) as chamfer_2_2_piece_9:
        Polygon((CHAMFER_2_SIZE * 0.999621916911, CHAMFER_2_SIZE * 0.0274958766106), (-CHAMFER_2_SIZE * 0.0274958766106, CHAMFER_2_SIZE * 0.999621916911), (0, 0), align=None)
    extrude(amount=22.339548002, mode=Mode.SUBTRACT)
    with BuildSketch(Plane(origin=(8.9, 4, 26.67544468), x_dir=(-1, 0, 0), z_dir=(0, 0, -1))) as chamfer_2_2_piece_10:
        Polygon((2, -CHAMFER_2_SIZE), (2 + CHAMFER_2_SIZE, 0), (2, 0), align=None)
    revolve(axis=Axis((8.9, 4, 26.67544468), (0, 1, 0)), revolution_arc=18.434948823, mode=Mode.SUBTRACT)
    with BuildSketch(Plane(origin=(7.797366596, 4, 29.692099788), x_dir=(0.02608487890572092, -0.9996219169112968, -0.008694959635240314), z_dir=(-0.3162277660168382, 0, -0.9486832980505138))) as chamfer_2_2_piece_11:
        Polygon((CHAMFER_2_SIZE * 0.999621916911, CHAMFER_2_SIZE * 0.0274958766106), (-CHAMFER_2_SIZE * 0.0274958766106, CHAMFER_2_SIZE * 0.999621916911), (0, 0), align=None)
    extrude(amount=2.513167019, mode=Mode.SUBTRACT)
    with BuildSketch(Plane(origin=(5.9, 4, 30.32455532), x_dir=(0.9486832980505135, 0, -0.3162277660168389), z_dir=(-0.3162277660168389, 0, -0.9486832980505135))) as chamfer_2_2_piece_12:
        Polygon((2, CHAMFER_2_SIZE), (2 - CHAMFER_2_SIZE, 0), (2, 0), align=None)
    revolve(axis=Axis((5.9, 4, 30.32455532), (0, -1, 0)), revolution_arc=18.434948823, mode=Mode.SUBTRACT)
    with BuildSketch(Plane(origin=(0, 4, 0), x_dir=(0.8989898989898987, 0, 0.43796936138745124), z_dir=(-0.43796936138745124, 0, 0.8989898989898987))) as chamfer_2_2_piece_13:
        Polygon((7.9, -CHAMFER_2_SIZE), (7.9 - CHAMFER_2_SIZE, 0), (7.9, 0), align=None)
    revolve(axis=Axis((0, 4, 0), (0, 1, 0)), revolution_arc=25.974390018, mode=Mode.SUBTRACT)
    with BuildSketch(Plane(origin=(0, 4, 0), x_dir=(-0.8989898989898987, 0, 0.43796936138745124), z_dir=(0.43796936138745124, 0, 0.8989898989898987))) as chamfer_2_2_piece_14:
        Polygon((7.9, CHAMFER_2_SIZE), (7.9 - CHAMFER_2_SIZE, 0), (7.9, 0), align=None)
    revolve(axis=Axis((0, 4, 0), (0, -1, 0)), revolution_arc=25.974390018, mode=Mode.SUBTRACT)


solid = part.part
